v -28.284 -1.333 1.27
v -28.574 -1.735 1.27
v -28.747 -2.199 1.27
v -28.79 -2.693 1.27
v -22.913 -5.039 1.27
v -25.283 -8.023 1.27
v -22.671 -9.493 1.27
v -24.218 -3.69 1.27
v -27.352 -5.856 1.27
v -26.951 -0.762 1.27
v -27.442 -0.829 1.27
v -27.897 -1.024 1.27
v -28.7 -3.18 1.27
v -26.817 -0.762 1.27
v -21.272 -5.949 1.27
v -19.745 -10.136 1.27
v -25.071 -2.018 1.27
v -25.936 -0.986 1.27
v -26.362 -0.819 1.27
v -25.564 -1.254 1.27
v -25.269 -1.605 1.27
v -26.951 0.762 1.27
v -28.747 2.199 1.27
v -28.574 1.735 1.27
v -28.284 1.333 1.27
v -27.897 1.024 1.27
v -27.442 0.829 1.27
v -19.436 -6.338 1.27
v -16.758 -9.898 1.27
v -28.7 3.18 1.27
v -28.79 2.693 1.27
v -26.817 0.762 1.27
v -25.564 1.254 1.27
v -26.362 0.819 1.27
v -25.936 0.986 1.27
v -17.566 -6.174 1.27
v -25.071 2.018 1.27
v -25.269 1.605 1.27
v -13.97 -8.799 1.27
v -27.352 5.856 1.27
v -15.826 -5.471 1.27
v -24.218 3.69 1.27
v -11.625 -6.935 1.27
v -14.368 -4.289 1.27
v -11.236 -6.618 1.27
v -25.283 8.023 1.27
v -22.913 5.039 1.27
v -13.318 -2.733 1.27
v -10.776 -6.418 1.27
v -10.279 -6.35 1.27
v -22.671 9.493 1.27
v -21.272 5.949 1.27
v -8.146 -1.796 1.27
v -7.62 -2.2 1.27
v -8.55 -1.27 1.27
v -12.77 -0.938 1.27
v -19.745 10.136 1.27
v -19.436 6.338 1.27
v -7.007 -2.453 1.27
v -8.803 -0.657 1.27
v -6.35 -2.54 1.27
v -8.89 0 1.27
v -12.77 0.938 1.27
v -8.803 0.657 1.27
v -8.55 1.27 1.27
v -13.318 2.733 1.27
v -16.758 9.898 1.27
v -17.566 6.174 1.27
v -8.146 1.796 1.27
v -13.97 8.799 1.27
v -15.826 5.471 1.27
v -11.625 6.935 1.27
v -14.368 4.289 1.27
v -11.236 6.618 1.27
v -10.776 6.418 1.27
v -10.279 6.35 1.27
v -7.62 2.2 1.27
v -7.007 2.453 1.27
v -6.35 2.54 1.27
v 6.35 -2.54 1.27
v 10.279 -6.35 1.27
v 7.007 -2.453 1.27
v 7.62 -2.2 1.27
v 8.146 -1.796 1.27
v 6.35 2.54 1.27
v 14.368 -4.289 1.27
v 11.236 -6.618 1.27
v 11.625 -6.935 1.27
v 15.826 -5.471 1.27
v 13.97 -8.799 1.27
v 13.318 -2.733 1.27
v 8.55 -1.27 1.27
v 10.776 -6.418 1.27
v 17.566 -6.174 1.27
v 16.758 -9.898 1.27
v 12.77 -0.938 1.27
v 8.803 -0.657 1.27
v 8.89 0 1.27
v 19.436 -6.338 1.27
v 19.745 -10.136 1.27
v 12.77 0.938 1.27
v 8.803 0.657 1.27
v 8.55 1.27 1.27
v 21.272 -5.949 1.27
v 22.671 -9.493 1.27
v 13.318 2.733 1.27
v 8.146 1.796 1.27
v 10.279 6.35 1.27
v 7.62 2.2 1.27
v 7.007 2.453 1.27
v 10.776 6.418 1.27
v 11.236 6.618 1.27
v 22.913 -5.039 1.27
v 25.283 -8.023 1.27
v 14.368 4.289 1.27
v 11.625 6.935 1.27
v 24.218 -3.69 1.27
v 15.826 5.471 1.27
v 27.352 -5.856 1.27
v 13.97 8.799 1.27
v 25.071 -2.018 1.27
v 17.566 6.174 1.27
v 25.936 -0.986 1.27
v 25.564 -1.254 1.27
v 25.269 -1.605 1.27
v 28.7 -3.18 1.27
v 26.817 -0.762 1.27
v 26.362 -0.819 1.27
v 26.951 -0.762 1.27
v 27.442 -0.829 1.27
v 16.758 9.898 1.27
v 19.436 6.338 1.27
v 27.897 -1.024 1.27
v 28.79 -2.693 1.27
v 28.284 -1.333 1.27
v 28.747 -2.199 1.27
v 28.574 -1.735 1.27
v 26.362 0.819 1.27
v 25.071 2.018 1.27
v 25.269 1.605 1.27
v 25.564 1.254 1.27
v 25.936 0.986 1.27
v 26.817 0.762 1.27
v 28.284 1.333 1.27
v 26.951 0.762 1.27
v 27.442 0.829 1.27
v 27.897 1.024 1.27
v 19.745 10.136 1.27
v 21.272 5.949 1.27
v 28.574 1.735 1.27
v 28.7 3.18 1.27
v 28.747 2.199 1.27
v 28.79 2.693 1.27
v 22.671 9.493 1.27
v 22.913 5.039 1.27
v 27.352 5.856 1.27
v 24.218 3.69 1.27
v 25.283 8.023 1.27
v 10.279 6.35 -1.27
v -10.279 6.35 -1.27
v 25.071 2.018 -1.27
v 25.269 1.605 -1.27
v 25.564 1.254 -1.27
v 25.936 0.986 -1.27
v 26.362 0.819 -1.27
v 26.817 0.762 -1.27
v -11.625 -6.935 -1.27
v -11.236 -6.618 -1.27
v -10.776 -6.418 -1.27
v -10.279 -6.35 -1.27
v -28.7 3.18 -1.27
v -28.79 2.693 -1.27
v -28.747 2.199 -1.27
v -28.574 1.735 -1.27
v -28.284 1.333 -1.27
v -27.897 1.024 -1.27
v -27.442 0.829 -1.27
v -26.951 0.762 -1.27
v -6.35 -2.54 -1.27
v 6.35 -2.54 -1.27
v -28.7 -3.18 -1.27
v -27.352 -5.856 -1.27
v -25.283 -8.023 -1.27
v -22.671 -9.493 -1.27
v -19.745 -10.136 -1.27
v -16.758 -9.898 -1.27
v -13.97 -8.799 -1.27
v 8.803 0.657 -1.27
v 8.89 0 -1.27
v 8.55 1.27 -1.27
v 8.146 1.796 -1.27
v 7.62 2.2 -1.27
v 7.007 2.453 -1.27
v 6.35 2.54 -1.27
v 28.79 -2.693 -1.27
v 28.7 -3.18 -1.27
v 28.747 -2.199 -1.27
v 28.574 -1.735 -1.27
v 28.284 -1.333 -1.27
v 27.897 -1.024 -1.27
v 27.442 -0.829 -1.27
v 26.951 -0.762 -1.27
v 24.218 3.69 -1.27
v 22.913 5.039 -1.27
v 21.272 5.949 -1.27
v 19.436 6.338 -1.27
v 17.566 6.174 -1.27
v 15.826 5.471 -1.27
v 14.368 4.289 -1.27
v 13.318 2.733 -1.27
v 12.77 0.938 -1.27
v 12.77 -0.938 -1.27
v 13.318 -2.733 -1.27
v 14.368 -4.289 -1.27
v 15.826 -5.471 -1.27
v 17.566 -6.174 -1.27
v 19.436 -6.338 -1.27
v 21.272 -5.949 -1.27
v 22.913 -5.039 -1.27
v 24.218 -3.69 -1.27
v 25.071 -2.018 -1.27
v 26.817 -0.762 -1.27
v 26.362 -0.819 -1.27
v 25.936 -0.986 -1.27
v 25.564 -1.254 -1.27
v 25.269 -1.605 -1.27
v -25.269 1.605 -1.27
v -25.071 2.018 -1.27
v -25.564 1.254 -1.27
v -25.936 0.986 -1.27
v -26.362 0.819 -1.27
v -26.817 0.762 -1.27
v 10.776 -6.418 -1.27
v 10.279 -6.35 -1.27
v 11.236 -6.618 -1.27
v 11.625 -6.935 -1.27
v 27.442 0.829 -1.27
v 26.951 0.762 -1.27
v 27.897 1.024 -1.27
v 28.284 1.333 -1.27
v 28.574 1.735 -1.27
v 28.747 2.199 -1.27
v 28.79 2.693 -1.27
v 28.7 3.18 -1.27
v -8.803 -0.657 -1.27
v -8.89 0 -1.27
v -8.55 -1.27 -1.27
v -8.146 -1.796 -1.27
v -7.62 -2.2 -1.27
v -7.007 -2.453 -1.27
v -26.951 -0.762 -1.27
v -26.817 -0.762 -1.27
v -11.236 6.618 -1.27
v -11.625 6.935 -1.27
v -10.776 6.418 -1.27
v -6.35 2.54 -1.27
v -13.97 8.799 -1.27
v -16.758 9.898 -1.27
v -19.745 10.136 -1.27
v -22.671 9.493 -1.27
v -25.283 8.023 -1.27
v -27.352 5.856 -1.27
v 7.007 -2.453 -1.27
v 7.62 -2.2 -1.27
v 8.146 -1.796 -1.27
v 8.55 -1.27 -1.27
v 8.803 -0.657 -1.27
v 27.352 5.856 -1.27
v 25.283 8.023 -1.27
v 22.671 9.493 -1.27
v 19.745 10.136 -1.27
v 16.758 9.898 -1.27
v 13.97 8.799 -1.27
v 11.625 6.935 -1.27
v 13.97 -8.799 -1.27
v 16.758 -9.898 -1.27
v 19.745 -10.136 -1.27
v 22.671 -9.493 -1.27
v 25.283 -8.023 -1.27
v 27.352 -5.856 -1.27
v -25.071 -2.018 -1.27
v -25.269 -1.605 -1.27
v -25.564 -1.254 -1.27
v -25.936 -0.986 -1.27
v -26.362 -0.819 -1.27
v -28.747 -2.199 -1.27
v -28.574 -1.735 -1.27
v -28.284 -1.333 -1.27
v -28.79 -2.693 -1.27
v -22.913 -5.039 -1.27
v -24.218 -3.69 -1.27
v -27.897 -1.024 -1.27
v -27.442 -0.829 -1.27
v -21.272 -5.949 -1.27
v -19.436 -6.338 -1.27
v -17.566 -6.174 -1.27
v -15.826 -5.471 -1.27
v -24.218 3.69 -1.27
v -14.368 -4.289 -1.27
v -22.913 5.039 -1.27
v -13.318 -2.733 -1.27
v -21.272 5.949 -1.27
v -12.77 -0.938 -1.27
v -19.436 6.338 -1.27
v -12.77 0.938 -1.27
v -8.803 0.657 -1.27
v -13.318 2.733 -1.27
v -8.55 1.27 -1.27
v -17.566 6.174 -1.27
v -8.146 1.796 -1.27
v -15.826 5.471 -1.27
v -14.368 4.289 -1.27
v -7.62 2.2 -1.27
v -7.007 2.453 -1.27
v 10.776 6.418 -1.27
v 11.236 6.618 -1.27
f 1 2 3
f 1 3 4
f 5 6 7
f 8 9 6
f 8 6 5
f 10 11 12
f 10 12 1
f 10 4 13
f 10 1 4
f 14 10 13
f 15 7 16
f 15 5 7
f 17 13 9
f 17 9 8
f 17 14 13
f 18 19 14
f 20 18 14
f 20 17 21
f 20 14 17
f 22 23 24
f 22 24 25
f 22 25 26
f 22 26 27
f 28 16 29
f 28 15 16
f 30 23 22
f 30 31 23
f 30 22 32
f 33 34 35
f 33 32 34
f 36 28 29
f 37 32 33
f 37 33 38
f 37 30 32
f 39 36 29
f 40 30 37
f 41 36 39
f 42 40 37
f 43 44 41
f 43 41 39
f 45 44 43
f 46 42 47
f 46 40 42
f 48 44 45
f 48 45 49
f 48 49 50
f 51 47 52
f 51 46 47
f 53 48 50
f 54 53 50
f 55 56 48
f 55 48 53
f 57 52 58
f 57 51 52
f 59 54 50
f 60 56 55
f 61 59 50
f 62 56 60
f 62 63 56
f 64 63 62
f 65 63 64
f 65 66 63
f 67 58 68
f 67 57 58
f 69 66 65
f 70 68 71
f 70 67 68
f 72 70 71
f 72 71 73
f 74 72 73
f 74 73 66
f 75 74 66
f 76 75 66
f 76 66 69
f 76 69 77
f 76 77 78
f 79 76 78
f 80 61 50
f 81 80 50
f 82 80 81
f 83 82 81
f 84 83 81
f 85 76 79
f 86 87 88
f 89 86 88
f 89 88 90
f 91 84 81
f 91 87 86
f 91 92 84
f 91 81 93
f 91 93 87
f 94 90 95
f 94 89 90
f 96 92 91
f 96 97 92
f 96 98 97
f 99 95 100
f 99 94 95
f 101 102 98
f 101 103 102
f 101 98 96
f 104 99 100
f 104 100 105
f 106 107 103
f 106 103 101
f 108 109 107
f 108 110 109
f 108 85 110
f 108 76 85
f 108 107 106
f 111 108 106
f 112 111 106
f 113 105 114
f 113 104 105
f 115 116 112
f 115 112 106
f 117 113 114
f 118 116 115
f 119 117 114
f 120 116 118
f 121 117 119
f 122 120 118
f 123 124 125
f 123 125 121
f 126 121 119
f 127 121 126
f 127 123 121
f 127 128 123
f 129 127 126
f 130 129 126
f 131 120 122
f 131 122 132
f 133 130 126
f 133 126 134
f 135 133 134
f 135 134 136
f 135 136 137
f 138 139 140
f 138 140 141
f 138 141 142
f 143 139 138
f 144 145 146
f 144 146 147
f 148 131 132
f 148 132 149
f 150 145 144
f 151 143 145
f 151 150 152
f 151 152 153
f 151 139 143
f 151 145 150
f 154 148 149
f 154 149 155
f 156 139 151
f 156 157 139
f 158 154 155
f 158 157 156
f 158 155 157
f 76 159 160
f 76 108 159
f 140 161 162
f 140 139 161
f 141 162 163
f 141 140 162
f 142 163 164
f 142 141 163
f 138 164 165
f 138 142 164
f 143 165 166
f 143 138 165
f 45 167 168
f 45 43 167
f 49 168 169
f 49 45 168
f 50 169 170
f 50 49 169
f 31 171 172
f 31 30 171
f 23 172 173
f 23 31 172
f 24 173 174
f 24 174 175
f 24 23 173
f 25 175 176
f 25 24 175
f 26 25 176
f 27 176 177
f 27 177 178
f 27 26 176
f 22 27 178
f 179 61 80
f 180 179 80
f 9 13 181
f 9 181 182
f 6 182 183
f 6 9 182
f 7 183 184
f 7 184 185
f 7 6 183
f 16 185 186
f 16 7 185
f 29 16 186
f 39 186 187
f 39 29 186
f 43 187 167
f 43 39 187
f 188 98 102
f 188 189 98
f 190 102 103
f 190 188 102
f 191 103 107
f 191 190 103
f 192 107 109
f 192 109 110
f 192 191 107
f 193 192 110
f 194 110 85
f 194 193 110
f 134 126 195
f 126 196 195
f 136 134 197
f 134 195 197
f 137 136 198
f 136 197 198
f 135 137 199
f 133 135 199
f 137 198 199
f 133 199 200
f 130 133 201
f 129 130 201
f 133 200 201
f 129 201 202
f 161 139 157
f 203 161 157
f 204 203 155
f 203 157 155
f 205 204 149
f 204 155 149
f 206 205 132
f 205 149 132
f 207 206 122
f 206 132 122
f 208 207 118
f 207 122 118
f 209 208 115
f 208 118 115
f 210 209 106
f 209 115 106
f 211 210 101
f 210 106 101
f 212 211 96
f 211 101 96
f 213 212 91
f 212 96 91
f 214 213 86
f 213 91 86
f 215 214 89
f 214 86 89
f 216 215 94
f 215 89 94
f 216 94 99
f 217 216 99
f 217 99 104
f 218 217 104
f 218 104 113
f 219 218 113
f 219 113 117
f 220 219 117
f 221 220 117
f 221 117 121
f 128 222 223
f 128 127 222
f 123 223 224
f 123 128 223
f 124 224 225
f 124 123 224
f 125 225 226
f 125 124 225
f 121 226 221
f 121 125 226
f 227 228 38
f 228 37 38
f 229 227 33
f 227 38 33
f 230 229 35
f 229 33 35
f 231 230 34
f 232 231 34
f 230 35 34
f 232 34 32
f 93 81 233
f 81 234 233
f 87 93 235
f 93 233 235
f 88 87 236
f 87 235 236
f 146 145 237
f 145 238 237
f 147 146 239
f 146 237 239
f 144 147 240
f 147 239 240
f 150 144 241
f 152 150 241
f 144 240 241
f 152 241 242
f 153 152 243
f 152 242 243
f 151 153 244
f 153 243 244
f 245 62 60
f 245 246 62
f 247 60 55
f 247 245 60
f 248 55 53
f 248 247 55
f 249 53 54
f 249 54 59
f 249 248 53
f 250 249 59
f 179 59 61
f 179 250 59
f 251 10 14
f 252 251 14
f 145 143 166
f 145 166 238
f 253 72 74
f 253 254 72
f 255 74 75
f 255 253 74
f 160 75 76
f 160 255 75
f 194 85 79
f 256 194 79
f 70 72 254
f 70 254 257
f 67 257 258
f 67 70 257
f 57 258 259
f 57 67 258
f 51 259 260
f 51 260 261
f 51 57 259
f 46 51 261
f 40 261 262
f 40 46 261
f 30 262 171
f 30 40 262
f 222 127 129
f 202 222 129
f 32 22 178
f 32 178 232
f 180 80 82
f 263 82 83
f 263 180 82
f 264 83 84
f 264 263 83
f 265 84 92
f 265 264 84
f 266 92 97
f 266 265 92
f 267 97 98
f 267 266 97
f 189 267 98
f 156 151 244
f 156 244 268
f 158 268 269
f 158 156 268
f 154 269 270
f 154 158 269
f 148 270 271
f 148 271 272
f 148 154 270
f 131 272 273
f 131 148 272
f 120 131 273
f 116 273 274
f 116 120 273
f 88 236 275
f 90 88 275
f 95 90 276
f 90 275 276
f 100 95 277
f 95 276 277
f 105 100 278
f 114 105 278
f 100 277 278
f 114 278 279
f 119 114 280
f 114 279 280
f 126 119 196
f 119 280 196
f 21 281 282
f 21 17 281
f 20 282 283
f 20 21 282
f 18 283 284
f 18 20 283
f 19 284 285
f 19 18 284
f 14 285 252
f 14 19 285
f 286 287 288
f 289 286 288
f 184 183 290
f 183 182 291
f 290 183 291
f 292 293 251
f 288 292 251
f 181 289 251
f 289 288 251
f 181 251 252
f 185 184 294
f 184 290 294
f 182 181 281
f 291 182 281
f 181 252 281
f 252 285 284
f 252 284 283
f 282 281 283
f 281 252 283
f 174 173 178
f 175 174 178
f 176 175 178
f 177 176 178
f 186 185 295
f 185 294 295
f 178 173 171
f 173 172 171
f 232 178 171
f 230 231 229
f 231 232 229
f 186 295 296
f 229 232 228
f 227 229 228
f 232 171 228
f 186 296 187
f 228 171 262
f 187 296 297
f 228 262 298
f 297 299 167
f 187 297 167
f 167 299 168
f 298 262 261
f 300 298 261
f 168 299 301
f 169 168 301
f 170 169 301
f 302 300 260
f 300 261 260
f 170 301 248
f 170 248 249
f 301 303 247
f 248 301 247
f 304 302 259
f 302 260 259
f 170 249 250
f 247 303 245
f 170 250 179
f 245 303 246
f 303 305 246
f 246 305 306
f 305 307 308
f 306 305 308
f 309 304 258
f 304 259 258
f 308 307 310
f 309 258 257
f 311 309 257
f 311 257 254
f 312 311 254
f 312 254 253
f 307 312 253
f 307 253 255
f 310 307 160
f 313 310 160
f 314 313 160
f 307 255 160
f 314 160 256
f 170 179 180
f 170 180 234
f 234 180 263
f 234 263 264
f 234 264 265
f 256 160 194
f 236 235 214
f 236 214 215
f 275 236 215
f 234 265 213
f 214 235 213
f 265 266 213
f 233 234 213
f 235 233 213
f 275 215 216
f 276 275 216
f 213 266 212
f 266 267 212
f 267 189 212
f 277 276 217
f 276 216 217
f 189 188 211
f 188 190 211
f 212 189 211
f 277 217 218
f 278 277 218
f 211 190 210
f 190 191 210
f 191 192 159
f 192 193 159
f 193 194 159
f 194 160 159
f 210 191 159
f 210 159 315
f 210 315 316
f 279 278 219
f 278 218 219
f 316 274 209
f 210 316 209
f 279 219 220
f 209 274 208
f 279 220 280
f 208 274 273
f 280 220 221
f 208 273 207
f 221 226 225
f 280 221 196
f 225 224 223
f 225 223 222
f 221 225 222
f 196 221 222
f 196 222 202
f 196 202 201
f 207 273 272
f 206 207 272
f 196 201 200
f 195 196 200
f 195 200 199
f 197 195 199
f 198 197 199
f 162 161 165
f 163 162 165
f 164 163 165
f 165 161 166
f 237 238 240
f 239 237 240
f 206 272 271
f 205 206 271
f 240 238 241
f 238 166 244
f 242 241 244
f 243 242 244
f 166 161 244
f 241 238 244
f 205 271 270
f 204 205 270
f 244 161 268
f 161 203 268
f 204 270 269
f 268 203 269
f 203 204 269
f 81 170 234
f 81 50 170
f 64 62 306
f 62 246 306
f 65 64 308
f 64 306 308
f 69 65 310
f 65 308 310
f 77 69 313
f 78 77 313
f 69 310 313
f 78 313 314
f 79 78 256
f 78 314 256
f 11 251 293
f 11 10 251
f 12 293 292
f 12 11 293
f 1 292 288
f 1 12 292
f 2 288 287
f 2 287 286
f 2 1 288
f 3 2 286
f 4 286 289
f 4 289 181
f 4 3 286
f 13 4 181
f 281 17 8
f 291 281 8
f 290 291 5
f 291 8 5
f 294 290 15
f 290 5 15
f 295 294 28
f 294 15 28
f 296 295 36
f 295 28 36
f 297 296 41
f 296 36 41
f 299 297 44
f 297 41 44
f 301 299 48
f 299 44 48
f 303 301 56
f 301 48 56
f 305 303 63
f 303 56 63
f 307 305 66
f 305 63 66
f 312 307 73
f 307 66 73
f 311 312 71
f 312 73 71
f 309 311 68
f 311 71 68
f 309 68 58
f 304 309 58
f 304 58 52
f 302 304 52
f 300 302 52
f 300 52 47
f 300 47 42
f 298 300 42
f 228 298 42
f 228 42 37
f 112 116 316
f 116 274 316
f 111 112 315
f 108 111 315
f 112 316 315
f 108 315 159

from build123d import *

# Parameters (mm, degrees)
F1_DEPTH = 1.27
F2_R     = 6.35
F3_DEPTH = 25.4
F4_W     = 12.6276115155
F4_H     = 1.524
F5_DEPTH = 25.4
F6_R     = 1.8415
F8_DEPTH = 25.4
F9_R     = 2.53999


# Not quite as in the source:
# - a fillet or chamfer is up to 0.001 mm smaller than in the source, because OpenCascade refuses the exact size


with BuildPart() as f1:
    # F0 (on Top) → F1 (new body, symmetric)
    with BuildSketch(Plane.XY):
        with BuildLine():
            ThreePointArc((-11.118852542, -6.35), (-9.4633932444, -3.3649028089), (-8.89, 0))
            ThreePointArc((-8.89, 0), (-9.4633932444, 3.3649028089), (-11.118852542, 6.35))
            ThreePointArc((-11.118852542, 6.35), (-29.21, 0), (-11.118852542, -6.35))
        make_face()
        with BuildLine():
            ThreePointArc((-11.118852542, 6.35), (-9.4633932444, 3.3649028089), (-8.89, 0))
            ThreePointArc((-8.89, 0), (-9.4633932444, -3.3649028089), (-11.118852542, -6.35))
            Line((-11.118852542, -6.35), (11.118852542, -6.35))
            ThreePointArc((11.118852542, -6.35), (8.89, 0), (11.118852542, 6.35))
            Line((11.118852542, 6.35), (-11.118852542, 6.35))
        make_face()
        with BuildLine():
            ThreePointArc((29.21, 0), (22.4149028089, 9.5866067556), (11.118852542, 6.35))
            ThreePointArc((11.118852542, 6.35), (8.89, 0), (11.118852542, -6.35))
            ThreePointArc((11.118852542, -6.35), (22.4149028089, -9.5866067556), (29.21, 0))
        make_face()
    extrude(amount=F1_DEPTH, both=True)

    # F2 (on face) → F3 (cut)
    with BuildSketch(Plane.XY.offset(1.27)):
        with Locations((-19.05, 0)):
            Circle(F2_R)
        with Locations((19.05, 0)):
            Circle(F2_R)
    extrude(amount=-F3_DEPTH, mode=Mode.SUBTRACT)

    # F4 (on face) → F5 (cut)
    with BuildSketch(Plane.XY.offset(1.27)):
        with Locations((-22.8961942422, 0)):
            Rectangle(F4_W, F4_H)
        with Locations((22.8961942422, 0)):
            Rectangle(F4_W, F4_H)
    extrude(amount=-F5_DEPTH, mode=Mode.SUBTRACT)

    # F6
    f6_edges = [f1.edges().sort_by_distance(p)[0] for p in [
        (-29.181385, 0.762, 0),
        (-25.354114, 0.762, 0),
        (-25.354114, -0.762, 0),
        (-29.181385, -0.762, 0),
        (25.354114, -0.762, 0),
        (25.354114, 0.762, 0),
        (29.181385, 0.762, 0),
        (29.181385, -0.762, 0),
        (-11.118853, -6.35, 0),
        (11.118853, -6.35, 0),
        (11.118853, 6.35, 0),
        (-11.118853, 6.35, 0),
    ]]
    fillet(f6_edges, radius=F6_R)

    # F7 (on face) → F8 (cut)
    with BuildSketch(Plane.XY.offset(1.27)):
        with BuildLine():
            ThreePointArc((-9.2126223006, 2.54), (-8.89, 0), (-9.2126223006, -2.54))
            Line((-9.2126223006, -2.54), (9.2126223006, -2.54))
            ThreePointArc((9.2126223006, -2.54), (8.89, 0), (9.2126223006, 2.54))
            Line((9.2126223006, 2.54), (-9.2126223006, 2.54))
        make_face()
    extrude(amount=-F8_DEPTH, mode=Mode.SUBTRACT)

    # F9 (radius 2.54 in the source; OpenCascade refuses exactly that, so slightly less here)
    f9_edges = [f1.edges().sort_by_distance(p)[0] for p in [
        (-9.212622, -2.54, 0),
        (-9.212622, 2.54, 0),
        (9.212622, 2.54, 0),
        (9.212622, -2.54, 0),
    ]]
    fillet(f9_edges, radius=F9_R)


solid = f1.part
